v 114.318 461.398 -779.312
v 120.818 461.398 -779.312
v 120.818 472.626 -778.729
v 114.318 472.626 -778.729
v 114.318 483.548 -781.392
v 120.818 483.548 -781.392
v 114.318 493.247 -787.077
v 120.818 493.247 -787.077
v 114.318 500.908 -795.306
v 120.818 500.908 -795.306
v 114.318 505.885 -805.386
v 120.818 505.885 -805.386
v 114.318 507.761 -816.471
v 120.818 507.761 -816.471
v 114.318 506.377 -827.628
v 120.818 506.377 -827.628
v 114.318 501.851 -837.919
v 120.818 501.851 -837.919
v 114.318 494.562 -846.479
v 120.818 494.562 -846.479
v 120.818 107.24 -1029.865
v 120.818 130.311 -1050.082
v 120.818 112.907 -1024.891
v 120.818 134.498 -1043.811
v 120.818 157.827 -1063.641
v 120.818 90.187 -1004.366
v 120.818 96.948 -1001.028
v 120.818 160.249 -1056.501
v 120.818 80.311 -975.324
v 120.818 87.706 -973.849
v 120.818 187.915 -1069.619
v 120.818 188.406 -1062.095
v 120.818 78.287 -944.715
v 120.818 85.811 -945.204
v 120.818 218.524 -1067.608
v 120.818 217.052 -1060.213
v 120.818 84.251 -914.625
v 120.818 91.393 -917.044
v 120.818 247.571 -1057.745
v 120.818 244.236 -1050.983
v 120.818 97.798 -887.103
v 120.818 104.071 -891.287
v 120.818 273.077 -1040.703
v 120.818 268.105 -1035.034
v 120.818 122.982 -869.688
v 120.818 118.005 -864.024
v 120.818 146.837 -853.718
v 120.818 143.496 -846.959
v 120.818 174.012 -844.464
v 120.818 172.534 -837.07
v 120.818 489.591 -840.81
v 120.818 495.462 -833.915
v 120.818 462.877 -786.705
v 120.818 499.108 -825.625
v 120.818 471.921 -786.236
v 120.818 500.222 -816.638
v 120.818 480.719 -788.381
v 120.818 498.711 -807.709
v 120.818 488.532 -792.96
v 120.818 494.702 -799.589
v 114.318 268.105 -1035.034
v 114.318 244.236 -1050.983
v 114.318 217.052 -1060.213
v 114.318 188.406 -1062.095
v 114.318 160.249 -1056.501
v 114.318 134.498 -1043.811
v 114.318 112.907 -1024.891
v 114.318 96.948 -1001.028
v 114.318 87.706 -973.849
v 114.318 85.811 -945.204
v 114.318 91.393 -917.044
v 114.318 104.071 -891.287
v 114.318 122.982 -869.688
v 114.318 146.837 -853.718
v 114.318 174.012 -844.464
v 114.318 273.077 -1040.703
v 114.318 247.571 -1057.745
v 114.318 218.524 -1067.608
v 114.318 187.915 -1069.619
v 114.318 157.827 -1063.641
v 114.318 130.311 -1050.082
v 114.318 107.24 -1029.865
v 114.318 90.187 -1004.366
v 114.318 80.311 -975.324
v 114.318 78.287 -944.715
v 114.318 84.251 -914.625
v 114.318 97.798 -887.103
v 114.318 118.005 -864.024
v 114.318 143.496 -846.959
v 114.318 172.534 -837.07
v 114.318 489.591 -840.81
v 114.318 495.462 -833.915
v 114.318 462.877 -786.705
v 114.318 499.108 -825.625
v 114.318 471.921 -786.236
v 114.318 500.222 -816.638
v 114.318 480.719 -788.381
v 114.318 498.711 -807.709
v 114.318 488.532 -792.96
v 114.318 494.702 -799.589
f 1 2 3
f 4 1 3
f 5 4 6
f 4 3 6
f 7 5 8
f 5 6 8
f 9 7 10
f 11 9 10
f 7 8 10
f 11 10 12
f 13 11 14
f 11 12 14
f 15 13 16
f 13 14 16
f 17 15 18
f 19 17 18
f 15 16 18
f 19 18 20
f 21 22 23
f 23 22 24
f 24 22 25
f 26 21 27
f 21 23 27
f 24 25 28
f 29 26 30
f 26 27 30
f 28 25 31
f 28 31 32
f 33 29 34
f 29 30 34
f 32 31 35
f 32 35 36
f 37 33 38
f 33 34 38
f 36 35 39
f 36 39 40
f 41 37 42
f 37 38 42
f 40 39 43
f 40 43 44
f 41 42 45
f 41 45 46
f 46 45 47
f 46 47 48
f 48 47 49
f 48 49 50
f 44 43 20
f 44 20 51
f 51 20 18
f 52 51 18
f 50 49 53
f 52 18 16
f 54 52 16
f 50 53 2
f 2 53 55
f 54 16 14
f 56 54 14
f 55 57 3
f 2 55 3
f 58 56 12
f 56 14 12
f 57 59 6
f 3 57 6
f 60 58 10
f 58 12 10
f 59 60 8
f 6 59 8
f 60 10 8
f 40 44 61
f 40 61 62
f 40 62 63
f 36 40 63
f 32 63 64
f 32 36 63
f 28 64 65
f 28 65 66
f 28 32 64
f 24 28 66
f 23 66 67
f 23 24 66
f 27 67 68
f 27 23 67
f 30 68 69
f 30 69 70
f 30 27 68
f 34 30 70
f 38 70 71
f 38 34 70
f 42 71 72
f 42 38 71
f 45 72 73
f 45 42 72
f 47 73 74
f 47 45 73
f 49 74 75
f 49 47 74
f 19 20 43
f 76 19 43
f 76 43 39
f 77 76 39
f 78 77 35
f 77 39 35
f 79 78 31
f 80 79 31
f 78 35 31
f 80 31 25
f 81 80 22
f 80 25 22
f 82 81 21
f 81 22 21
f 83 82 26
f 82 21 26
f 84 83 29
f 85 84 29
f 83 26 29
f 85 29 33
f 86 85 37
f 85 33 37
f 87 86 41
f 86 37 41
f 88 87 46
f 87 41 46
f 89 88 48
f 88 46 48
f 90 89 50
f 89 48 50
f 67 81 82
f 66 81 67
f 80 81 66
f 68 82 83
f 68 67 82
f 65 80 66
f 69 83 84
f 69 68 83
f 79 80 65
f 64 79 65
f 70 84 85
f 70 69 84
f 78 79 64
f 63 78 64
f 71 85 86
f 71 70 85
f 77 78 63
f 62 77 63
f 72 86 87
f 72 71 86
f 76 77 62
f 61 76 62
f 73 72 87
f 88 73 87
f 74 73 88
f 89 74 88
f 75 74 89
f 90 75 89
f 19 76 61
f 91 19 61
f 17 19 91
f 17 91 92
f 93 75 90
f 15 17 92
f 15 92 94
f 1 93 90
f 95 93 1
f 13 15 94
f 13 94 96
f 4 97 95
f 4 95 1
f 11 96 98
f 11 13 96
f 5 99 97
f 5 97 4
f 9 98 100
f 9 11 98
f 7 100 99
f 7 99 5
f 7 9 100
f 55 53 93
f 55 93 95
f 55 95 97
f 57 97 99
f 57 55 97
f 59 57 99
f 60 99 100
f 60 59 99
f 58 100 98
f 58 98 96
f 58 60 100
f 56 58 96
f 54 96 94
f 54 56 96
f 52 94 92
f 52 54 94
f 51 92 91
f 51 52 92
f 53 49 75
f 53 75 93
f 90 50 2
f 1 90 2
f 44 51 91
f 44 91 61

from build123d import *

# Parameters (mm, degrees)
BOSS_EXTRUDE1_DEPTH = 6.5


with BuildPart() as part:
    # Sketch1 → Boss-Extrude1 (new body)
    with BuildSketch(Plane(origin=(120.8182, 0, 0), x_dir=(0, 0, -1), z_dir=(1, 0, 0))):
        with BuildLine():
            Line((846.478661638, 494.561851817), (1040.702839036, 273.07651954))
            ThreePointArc((1040.702839036, 273.07651954), (1004.366479469, 90.186693697), (837.070444967, 172.533862824))
            Line((837.070444967, 172.533862824), (779.311502219, 461.398343217))
            ThreePointArc((779.311502219, 461.398343217), (800.164646921, 503.763471885), (846.478661638, 494.561851817))
        make_face()
        with BuildLine():
            Line((840.809621425, 489.590576019), (1035.033798823, 268.105243742))
            ThreePointArc((1035.033798823, 268.105243742), (1001.028357677, 96.947503035), (844.464091935, 174.012235074))
            Line((844.464091935, 174.012235074), (786.705149187, 462.876715467))
            ThreePointArc((786.705149187, 462.876715467), (803.502768714, 497.002662547), (840.809621425, 489.590576019))
        make_face(mode=Mode.SUBTRACT)
    extrude(amount=-BOSS_EXTRUDE1_DEPTH)


solid = part.part
